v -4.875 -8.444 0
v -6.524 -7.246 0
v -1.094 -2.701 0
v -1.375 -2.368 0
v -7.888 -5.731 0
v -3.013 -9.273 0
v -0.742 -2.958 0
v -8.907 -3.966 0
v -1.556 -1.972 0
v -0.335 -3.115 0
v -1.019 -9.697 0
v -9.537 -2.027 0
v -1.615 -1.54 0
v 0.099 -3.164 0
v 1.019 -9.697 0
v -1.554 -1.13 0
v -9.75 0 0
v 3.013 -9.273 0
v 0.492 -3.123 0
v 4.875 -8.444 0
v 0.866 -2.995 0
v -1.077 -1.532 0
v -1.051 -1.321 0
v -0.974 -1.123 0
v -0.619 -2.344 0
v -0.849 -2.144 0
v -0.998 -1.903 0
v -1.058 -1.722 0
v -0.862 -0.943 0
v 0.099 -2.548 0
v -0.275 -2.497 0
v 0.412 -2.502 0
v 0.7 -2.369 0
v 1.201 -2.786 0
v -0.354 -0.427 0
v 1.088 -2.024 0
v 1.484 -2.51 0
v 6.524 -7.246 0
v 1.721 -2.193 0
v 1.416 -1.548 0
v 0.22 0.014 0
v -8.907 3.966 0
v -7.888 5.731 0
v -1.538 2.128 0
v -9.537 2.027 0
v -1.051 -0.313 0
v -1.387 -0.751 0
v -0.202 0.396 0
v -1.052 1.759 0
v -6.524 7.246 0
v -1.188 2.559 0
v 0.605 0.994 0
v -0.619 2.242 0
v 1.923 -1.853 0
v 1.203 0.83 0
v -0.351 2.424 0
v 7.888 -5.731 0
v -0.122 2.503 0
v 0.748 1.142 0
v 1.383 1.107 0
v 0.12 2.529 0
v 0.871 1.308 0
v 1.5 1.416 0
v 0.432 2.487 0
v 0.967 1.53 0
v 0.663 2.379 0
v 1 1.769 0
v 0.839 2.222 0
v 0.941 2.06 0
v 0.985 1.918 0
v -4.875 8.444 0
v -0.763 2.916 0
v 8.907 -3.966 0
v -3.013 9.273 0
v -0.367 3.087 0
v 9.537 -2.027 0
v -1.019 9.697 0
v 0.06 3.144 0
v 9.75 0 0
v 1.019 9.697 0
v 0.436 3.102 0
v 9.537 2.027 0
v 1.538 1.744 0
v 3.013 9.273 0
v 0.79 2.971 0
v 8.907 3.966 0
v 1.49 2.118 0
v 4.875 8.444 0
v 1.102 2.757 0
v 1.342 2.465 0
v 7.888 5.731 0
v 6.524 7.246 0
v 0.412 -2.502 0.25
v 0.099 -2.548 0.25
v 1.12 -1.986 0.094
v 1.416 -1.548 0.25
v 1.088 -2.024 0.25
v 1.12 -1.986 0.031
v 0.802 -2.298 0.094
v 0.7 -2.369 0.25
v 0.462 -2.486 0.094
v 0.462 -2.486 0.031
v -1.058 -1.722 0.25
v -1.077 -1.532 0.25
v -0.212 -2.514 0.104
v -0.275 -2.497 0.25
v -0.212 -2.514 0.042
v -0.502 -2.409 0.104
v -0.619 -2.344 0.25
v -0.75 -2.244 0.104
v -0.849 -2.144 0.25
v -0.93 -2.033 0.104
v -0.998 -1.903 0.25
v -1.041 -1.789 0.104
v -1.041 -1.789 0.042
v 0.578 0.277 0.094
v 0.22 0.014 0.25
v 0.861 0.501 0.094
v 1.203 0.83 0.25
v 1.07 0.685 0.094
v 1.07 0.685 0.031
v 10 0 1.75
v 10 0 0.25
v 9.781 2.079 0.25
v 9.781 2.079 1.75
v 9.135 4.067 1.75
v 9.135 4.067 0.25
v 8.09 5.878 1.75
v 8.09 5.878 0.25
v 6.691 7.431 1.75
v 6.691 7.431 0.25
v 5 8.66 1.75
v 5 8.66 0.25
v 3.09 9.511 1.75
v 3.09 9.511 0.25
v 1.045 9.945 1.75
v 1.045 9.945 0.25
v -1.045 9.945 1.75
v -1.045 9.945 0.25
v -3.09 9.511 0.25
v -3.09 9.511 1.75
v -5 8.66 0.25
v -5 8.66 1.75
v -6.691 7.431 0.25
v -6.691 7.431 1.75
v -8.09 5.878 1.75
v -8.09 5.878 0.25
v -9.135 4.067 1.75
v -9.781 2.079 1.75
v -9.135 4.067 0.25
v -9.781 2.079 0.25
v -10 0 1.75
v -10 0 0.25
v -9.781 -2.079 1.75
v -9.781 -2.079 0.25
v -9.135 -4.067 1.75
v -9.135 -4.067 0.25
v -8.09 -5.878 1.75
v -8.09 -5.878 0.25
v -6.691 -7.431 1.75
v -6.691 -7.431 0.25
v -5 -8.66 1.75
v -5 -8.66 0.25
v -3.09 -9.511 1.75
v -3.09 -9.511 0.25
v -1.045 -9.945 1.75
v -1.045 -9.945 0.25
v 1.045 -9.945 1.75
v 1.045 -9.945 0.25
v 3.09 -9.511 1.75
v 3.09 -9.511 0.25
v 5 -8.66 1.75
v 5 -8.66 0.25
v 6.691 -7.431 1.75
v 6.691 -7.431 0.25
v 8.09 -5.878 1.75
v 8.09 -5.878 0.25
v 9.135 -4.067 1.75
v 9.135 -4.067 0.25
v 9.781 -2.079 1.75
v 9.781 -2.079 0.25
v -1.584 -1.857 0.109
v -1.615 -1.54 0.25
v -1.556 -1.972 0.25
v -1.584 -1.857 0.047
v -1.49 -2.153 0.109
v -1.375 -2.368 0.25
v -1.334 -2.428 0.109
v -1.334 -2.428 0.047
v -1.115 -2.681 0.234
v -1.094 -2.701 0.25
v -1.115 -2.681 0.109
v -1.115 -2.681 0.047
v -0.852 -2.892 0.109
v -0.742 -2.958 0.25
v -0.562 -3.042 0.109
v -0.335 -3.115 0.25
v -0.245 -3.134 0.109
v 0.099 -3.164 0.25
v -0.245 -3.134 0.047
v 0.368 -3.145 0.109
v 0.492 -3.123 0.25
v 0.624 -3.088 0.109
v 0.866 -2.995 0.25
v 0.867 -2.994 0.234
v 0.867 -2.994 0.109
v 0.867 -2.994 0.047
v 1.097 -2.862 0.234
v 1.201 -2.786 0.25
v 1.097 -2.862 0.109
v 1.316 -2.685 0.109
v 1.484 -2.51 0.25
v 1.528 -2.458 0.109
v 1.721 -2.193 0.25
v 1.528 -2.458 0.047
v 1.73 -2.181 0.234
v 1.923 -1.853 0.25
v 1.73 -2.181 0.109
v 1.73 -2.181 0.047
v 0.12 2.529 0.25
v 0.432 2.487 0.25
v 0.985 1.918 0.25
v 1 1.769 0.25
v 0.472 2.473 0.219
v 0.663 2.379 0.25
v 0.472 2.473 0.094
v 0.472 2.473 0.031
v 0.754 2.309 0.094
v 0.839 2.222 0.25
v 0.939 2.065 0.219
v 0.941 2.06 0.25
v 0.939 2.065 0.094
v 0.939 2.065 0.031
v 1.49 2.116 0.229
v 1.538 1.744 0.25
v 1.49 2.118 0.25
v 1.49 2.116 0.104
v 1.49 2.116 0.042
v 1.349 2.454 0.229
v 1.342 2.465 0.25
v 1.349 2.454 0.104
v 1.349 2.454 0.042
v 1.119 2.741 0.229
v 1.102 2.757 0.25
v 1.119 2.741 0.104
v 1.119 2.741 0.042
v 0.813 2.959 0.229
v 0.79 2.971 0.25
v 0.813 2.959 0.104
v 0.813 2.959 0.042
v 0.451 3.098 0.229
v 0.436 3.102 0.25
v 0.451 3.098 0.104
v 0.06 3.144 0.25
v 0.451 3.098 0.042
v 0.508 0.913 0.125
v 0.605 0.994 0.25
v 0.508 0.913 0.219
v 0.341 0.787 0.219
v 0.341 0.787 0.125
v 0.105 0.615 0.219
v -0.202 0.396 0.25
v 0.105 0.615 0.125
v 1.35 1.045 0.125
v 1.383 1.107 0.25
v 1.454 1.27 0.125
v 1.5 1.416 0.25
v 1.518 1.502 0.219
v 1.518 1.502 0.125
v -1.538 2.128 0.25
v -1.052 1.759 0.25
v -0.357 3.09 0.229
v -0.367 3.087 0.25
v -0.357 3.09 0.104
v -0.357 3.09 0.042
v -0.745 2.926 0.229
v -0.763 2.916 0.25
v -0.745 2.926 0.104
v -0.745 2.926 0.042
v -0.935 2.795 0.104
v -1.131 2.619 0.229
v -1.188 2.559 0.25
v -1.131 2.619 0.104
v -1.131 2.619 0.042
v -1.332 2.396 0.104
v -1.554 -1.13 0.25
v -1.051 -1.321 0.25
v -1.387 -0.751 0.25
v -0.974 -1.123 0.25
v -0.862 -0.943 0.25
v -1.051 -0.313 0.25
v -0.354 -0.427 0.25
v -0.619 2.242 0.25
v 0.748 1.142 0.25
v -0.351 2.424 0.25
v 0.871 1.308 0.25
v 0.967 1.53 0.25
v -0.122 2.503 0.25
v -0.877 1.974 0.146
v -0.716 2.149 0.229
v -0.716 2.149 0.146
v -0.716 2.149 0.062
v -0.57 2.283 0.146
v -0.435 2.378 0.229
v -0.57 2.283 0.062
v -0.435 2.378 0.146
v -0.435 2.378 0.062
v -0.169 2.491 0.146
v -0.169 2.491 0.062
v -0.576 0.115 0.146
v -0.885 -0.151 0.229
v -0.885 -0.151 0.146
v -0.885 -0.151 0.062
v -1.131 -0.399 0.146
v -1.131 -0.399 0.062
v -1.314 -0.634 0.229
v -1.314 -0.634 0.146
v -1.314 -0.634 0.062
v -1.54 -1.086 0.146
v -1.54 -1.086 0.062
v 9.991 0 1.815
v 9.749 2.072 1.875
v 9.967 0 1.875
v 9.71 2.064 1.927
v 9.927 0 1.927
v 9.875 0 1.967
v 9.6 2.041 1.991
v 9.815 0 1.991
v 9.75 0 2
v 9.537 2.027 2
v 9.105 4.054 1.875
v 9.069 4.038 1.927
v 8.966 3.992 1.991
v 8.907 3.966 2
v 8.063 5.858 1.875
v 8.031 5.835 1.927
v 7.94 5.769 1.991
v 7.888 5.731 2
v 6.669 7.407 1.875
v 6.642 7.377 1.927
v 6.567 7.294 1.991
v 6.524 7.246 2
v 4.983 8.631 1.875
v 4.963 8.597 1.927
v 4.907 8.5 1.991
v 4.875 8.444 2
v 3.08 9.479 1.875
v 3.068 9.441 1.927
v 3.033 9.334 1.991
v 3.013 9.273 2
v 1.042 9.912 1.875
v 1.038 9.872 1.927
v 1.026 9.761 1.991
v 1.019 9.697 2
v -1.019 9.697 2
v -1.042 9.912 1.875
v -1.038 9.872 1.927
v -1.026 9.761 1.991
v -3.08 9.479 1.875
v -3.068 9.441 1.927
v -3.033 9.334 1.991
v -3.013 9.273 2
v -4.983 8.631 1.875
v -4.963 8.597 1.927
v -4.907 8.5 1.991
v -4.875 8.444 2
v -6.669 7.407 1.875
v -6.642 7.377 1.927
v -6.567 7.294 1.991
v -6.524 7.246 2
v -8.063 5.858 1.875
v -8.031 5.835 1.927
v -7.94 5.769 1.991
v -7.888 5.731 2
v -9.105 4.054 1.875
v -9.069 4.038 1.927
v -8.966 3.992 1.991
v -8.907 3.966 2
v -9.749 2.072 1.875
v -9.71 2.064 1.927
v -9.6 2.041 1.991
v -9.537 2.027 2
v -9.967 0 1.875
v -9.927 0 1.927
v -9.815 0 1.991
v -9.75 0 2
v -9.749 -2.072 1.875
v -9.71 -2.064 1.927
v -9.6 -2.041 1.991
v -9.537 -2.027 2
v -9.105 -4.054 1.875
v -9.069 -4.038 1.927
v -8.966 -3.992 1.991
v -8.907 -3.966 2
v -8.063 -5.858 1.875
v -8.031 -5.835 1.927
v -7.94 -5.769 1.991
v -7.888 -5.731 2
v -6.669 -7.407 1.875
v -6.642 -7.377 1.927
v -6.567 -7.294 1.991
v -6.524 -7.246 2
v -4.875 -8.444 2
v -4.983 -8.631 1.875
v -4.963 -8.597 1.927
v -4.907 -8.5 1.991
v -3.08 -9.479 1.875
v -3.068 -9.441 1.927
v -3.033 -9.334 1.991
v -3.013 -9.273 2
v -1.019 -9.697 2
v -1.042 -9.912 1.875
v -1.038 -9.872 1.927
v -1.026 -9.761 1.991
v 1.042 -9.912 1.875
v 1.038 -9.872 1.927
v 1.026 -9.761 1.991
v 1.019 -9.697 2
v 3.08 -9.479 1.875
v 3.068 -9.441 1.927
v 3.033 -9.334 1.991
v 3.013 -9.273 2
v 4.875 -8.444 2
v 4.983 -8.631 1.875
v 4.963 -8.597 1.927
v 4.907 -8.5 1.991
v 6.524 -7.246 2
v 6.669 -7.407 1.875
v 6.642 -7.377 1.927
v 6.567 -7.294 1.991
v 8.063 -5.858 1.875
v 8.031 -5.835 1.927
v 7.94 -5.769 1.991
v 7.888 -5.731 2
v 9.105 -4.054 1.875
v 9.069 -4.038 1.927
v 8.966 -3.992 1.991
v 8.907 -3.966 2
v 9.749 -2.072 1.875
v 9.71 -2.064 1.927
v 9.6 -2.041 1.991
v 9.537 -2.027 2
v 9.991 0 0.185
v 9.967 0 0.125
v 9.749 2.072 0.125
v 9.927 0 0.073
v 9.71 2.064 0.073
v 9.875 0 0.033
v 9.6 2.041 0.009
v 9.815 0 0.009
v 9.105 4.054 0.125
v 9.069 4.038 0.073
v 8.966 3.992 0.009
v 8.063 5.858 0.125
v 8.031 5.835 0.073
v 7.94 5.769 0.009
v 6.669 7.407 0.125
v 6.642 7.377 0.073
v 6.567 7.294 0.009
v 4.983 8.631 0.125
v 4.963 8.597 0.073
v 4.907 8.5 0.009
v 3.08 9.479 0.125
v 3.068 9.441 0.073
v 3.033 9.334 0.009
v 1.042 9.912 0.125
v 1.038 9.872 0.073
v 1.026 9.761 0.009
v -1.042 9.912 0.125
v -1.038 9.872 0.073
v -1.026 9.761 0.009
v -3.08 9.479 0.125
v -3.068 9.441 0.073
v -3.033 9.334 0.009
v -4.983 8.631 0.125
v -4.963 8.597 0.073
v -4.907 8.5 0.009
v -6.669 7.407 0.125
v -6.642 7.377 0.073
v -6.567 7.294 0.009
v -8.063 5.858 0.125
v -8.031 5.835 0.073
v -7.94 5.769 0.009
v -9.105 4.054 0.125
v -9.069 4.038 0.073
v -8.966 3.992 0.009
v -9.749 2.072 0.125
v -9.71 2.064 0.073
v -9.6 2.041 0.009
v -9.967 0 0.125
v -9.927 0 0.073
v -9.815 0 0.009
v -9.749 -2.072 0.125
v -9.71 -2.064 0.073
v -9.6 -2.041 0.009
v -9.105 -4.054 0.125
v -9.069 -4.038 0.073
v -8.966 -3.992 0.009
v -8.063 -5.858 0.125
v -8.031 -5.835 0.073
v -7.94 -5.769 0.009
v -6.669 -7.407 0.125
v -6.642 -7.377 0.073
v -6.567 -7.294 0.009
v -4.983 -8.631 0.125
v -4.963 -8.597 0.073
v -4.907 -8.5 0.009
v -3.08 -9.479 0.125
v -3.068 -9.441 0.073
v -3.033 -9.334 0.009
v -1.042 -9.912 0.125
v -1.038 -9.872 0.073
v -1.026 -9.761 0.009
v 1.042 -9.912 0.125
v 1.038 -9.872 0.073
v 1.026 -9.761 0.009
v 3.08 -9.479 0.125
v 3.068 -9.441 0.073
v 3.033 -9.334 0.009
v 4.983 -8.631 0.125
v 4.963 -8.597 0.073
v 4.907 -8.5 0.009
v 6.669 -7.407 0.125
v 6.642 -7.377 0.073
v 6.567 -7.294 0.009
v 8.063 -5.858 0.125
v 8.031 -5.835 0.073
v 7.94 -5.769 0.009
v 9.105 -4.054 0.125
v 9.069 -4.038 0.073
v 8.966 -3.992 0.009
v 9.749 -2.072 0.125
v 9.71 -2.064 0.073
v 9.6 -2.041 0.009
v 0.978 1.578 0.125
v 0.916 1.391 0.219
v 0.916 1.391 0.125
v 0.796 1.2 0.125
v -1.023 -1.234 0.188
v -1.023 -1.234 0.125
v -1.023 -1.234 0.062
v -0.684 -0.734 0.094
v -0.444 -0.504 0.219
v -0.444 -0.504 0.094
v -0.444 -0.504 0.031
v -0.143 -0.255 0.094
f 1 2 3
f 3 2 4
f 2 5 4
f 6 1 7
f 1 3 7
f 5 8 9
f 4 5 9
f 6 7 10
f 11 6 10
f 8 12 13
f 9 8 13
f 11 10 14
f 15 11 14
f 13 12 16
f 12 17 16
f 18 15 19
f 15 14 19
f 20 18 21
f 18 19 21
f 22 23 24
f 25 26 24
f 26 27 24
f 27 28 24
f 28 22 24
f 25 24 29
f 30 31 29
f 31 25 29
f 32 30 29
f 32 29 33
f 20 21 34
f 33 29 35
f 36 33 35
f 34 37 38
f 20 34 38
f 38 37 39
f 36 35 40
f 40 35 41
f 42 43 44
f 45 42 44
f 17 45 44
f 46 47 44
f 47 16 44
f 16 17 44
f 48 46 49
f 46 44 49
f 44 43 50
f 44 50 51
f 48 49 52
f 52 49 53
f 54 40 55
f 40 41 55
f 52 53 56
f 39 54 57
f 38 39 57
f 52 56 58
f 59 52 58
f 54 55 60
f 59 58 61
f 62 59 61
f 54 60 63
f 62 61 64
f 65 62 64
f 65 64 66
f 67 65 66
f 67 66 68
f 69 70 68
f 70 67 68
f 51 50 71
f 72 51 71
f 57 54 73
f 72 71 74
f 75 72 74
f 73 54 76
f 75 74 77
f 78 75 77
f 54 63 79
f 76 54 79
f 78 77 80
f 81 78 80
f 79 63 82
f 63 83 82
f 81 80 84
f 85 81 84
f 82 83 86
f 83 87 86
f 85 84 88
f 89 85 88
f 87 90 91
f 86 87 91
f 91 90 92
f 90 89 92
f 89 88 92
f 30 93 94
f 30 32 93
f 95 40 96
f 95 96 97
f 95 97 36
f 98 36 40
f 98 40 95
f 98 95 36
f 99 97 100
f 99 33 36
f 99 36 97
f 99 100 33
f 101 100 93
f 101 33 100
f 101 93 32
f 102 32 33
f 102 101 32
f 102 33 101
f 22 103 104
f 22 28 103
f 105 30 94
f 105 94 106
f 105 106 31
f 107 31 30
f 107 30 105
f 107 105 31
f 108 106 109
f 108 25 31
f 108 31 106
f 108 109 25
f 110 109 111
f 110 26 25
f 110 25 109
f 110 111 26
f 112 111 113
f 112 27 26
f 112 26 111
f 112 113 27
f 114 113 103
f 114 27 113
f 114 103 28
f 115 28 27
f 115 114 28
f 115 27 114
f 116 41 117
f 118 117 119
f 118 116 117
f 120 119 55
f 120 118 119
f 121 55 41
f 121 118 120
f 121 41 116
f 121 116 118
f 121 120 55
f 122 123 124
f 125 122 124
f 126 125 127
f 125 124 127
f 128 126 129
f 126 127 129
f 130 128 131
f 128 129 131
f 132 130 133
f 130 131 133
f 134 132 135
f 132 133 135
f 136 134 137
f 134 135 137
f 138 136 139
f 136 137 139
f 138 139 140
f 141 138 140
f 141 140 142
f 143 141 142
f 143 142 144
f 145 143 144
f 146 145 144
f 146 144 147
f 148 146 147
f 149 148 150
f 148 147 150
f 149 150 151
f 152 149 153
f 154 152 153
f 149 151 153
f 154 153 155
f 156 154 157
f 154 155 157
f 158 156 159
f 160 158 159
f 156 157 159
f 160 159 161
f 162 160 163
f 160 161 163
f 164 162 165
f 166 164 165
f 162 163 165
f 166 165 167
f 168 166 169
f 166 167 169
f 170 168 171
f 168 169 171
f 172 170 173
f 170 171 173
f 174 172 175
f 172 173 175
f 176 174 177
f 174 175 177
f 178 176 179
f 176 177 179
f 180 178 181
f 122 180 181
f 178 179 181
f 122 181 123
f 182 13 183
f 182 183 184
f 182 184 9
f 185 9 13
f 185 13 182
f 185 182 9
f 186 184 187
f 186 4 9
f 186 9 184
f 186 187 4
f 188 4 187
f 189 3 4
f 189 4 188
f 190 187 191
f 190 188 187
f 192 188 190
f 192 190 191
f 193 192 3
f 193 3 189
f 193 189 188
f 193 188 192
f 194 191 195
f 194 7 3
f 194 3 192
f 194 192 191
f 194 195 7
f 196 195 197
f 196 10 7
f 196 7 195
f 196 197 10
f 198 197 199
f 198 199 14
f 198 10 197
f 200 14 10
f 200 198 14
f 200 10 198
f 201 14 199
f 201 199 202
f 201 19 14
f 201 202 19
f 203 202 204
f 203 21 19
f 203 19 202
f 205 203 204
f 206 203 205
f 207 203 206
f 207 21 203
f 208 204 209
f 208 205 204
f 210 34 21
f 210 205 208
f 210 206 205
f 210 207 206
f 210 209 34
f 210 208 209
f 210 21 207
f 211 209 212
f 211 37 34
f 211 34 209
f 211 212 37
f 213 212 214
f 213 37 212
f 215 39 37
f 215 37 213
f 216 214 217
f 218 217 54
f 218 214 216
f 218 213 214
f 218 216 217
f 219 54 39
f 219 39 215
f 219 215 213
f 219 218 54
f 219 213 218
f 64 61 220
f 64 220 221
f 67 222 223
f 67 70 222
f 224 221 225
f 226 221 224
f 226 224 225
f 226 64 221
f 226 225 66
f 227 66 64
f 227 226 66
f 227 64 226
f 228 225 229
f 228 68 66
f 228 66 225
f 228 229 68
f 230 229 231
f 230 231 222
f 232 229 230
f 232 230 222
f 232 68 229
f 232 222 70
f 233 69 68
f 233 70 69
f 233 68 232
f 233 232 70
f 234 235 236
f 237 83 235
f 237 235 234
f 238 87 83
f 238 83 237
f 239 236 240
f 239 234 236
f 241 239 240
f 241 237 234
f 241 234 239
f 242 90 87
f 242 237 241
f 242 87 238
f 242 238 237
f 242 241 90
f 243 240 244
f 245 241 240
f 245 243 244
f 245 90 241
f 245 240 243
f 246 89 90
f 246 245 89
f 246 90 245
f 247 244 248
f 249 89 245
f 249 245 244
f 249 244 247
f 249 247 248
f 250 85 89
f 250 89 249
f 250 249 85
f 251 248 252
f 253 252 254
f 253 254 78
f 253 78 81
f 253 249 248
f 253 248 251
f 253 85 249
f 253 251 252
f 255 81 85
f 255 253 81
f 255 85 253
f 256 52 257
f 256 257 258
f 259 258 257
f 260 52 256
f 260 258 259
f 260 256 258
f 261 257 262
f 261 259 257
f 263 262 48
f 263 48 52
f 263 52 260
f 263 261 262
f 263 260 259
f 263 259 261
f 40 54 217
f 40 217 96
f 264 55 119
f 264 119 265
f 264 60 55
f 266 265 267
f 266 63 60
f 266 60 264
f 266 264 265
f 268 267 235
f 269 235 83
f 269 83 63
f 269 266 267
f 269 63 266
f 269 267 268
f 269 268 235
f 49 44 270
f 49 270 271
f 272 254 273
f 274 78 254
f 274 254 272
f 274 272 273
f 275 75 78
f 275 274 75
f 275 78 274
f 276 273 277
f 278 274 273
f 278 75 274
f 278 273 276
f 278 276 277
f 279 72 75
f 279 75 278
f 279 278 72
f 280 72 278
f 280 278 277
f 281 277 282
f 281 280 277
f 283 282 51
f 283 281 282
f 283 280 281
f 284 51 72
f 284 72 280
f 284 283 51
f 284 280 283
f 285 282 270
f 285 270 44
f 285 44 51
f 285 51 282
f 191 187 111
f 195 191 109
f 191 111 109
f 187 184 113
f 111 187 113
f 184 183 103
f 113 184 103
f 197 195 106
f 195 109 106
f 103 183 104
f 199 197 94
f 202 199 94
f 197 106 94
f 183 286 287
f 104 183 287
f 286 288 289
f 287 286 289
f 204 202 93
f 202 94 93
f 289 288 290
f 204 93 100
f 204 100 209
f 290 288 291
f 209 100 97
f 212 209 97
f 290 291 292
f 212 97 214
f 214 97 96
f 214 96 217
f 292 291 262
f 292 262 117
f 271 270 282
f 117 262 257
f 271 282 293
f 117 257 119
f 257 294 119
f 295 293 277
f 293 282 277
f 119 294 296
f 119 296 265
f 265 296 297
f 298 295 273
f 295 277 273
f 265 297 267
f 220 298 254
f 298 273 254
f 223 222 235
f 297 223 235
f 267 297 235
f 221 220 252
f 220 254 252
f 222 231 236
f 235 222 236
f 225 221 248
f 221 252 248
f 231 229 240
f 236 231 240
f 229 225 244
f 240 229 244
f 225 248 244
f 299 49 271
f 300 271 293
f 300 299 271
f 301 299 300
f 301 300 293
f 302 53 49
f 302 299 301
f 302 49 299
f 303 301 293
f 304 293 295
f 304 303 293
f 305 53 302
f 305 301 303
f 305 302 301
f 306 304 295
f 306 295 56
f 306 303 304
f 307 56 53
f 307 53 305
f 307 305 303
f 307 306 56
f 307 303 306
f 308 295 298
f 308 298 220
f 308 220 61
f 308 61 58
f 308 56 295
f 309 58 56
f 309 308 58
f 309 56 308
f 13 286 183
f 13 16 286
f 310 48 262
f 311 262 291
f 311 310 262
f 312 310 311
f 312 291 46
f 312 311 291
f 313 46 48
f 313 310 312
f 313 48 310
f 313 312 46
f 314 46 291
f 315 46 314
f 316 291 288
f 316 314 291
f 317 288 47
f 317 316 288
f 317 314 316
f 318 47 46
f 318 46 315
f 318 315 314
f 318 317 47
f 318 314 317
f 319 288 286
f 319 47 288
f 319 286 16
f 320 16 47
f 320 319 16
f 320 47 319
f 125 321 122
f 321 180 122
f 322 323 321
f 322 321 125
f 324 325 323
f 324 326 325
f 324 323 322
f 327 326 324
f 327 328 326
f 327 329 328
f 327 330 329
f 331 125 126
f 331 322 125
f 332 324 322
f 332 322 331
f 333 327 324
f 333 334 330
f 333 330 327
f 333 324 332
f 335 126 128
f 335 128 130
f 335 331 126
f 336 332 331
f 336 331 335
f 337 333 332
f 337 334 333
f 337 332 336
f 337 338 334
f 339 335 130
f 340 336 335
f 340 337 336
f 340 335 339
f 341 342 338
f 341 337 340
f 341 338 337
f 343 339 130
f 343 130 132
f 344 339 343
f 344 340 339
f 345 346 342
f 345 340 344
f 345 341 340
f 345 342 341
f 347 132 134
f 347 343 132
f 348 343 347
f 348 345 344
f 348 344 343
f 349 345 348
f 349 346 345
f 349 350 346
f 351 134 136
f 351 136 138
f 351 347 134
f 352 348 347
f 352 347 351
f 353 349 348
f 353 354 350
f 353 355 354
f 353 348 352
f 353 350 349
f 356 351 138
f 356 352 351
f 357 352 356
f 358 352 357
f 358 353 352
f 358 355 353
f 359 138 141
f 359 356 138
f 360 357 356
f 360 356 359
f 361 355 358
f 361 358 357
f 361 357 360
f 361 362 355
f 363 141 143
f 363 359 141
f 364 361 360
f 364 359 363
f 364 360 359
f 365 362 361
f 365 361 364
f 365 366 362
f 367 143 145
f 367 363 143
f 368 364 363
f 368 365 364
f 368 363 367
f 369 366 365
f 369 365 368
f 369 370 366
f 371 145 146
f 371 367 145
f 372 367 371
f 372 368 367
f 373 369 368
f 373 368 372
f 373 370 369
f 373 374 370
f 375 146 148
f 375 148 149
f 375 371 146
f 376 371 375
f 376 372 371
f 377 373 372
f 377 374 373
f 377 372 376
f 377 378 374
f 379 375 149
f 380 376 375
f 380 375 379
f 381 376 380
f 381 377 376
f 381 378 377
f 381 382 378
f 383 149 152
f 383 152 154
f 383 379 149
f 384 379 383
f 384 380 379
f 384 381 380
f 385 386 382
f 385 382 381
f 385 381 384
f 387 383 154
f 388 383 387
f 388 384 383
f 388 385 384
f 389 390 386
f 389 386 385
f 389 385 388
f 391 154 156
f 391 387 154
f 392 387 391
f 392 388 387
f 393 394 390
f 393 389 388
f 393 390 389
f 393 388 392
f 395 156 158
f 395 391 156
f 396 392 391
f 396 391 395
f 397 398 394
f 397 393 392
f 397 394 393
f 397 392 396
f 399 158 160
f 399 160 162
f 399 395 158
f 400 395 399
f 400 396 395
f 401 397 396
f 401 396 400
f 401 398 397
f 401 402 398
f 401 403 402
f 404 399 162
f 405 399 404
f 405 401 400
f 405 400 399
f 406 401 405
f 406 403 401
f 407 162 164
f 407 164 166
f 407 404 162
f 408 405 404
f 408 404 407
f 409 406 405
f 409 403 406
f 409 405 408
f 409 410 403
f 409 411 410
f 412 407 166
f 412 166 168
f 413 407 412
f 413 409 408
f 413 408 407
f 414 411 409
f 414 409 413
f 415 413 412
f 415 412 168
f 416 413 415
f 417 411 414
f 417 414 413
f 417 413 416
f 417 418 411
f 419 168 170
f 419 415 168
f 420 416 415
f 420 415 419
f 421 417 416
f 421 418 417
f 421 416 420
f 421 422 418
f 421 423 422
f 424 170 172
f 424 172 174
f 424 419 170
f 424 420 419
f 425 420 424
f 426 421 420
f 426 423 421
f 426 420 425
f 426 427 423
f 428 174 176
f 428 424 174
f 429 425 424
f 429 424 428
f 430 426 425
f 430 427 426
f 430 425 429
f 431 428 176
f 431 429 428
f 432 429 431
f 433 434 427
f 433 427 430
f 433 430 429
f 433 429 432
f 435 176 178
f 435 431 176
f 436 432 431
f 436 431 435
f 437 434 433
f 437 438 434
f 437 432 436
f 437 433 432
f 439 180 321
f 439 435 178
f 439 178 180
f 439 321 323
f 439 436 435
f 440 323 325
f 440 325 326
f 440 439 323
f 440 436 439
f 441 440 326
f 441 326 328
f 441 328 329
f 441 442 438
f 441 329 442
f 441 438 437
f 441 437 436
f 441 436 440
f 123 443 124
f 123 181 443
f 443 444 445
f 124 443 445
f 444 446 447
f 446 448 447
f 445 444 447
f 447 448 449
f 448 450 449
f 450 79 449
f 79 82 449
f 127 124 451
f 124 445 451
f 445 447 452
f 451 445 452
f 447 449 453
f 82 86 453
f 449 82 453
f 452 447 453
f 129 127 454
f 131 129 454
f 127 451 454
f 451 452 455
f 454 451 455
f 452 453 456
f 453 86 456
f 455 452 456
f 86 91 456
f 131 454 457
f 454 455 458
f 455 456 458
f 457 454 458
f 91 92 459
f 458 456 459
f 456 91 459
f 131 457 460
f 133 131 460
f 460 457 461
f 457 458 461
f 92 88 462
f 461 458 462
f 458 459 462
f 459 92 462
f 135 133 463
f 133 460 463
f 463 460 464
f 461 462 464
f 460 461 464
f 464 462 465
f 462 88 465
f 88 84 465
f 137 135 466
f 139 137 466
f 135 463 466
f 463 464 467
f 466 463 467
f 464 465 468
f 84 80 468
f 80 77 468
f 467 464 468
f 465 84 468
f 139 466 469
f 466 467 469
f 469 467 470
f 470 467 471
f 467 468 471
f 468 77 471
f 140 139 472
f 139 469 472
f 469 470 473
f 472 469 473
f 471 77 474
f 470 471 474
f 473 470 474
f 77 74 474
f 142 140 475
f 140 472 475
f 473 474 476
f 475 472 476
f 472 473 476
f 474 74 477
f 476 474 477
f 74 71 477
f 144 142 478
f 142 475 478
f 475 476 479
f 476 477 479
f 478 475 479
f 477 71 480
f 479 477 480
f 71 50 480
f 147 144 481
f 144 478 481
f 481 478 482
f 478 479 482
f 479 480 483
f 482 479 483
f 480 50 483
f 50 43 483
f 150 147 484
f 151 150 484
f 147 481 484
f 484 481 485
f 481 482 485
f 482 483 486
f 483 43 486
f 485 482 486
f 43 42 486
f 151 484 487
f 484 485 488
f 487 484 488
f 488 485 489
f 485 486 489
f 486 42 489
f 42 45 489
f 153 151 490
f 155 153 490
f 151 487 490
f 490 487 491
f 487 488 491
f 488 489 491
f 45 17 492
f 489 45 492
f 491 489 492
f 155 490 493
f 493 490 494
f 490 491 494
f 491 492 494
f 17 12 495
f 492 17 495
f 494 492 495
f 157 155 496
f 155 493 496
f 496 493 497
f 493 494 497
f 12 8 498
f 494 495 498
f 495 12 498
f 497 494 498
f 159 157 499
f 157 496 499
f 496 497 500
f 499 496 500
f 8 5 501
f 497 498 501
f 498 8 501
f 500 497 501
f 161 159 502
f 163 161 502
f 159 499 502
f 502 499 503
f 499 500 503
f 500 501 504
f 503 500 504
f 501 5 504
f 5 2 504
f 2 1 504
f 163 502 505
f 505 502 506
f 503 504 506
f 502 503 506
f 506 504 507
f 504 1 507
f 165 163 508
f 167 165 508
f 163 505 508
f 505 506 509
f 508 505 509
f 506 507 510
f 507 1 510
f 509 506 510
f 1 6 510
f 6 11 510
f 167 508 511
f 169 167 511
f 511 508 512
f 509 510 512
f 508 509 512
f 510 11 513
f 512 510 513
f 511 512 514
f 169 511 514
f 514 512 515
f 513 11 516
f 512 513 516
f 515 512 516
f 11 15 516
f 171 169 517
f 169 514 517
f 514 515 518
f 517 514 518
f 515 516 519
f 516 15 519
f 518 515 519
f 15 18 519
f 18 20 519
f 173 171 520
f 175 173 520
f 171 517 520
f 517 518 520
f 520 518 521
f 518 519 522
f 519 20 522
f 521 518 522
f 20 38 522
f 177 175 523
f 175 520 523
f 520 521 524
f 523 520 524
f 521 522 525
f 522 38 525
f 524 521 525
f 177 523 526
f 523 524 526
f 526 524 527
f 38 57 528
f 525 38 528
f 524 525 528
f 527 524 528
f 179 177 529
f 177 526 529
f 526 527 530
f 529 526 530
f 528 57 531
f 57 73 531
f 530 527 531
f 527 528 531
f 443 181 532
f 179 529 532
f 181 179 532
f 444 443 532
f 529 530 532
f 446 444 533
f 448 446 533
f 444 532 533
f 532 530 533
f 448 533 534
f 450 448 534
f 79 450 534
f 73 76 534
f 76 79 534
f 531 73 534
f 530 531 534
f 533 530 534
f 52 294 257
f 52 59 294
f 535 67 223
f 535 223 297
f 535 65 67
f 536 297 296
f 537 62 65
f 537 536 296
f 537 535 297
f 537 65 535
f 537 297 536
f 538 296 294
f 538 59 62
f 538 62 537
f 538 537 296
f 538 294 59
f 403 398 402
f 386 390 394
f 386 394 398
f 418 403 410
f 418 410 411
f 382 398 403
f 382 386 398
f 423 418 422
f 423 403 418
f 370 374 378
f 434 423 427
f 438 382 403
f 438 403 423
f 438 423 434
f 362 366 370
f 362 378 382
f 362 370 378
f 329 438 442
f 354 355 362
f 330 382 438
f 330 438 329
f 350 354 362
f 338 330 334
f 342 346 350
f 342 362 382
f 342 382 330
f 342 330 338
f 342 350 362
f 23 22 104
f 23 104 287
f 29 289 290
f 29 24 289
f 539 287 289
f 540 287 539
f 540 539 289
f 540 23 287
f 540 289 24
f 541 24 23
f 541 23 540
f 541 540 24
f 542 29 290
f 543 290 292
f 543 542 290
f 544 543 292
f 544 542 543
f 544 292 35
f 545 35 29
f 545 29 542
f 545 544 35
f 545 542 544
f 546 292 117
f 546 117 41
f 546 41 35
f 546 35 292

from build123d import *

# Parameters (mm, degrees)
ESQUISSE1_R             = 10
BOSS_EXTRU_1_DEPTH      = 2
CONG_1_R                = 0.25
ENL_V_MAT_EXTRU_1_DEPTH = 0.25


with BuildPart() as part:
    # Esquisse1 → Boss.-Extru.1 (new body)
    with BuildSketch(Plane.XY):
        Circle(ESQUISSE1_R)
    extrude(amount=BOSS_EXTRU_1_DEPTH)

    # Congé1
    cong_1_edges = [part.edges().sort_by_distance(p)[0] for p in [
        (-10, 0, 0),
        (-10, 0, 2),
    ]]
    fillet(cong_1_edges, radius=CONG_1_R)

    # Esquisse2 → Enlèv. mat.-Extru.1 (cut)
    with BuildSketch(Plane(origin=(0, 0, 0), x_dir=(-1, 0, 0), z_dir=(0, 0, -1))):
        with BuildLine():
            Line((-1.923076923, -1.852508928), (-1.415865385, -1.54842239))
            add(Edge.make_bspline(
                [(-1.415865385, -1.54842239), (-1.368691264, -1.627389907), (-1.278307468, -1.778688622), (-1.12753371, -1.983130977), (-0.971305862, -2.156894674), (-0.808467004, -2.298968859), (-0.640011093, -2.410824093), (-0.46483843, -2.490027919), (-0.283539326, -2.539426734), (-0.160155632, -2.545426882), (-0.098557692, -2.54842239)],
                knots=[0, 0, 0, 0, 1.272034388, 2.437168799, 3.508375237, 4.49857839, 5.41946034, 6.295179144, 7.148887113, 8, 8, 8, 8], degree=3))
            add(Edge.make_bspline(
                [(-0.098557692, -2.54842239), (-0.045951646, -2.546957237), (0.058339965, -2.544052568), (0.211875239, -2.516142621), (0.3609869, -2.473264686), (0.502601707, -2.411857375), (0.634765618, -2.337562828), (0.75066281, -2.247826524), (0.850856147, -2.147358742), (0.932814629, -2.035274192), (0.99569469, -1.914730508), (1.04402395, -1.791000306), (1.070844076, -1.662139903), (1.074884225, -1.57537911), (1.076923077, -1.531595467)],
                knots=[0, 0, 0, 0, 1.095163259, 2.171163733, 3.241058638, 4.321873601, 5.38011039, 6.391990106, 7.366004449, 8.327778327, 9.272591725, 10.192022065, 11.087607919, 12, 12, 12, 12], degree=3))
            add(Edge.make_bspline(
                [(1.076923077, -1.531595467), (1.074395687, -1.481639724), (1.069257873, -1.380087), (1.025832479, -1.230259023), (0.957519484, -1.081986046), (0.894497809, -0.990269591), (0.861778846, -0.942653159)],
                knots=[0, 0, 0, 0, 0.938893495, 1.908633276, 2.914225137, 4, 4, 4, 4], degree=3))
            add(Edge.make_bspline(
                [(0.861778846, -0.942653159), (0.834914936, -0.908287176), (0.778517517, -0.836140092), (0.681561781, -0.72874826), (0.5677913, -0.617973828), (0.441099491, -0.499586873), (0.296871339, -0.379093507), (0.139624172, -0.250747888), (-0.03465673, -0.119430899), (-0.156884438, -0.031363643), (-0.219951923, 0.01407761)],
                knots=[0, 0, 0, 0, 0.722233717, 1.516239348, 2.393582979, 3.351407094, 4.387010283, 5.505090956, 6.712668013, 8, 8, 8, 8], degree=3))
            add(Edge.make_bspline(
                [(-0.219951923, 0.01407761), (-0.283078774, 0.059040903), (-0.403772505, 0.145007296), (-0.572558646, 0.272591783), (-0.723492011, 0.389238416), (-0.855901754, 0.496045294), (-0.969729634, 0.593026902), (-1.065872625, 0.679251941), (-1.14188158, 0.757052331), (-1.184148289, 0.807523202), (-1.203125, 0.83018338)],
                knots=[0, 0, 0, 0, 1.452282411, 2.77665338, 3.964542531, 5.026858415, 5.96415736, 6.766646006, 7.446254459, 8, 8, 8, 8], degree=3))
            add(Edge.make_bspline(
                [(-1.203125, 0.83018338), (-1.229649363, 0.865499443), (-1.281813083, 0.934953221), (-1.350669093, 1.04351012), (-1.409193372, 1.154635718), (-1.455071655, 1.268628628), (-1.493705173, 1.383888506), (-1.519690198, 1.501919213), (-1.535961164, 1.622191131), (-1.537627426, 1.70312856), (-1.538461538, 1.743644918)],
                knots=[0, 0, 0, 0, 1.068054152, 2.10047183, 3.106115577, 4.101338837, 5.06977816, 6.043150881, 7.020423561, 8, 8, 8, 8], degree=3))
            add(Edge.make_bspline(
                [(-1.538461538, 1.743644918), (-1.536224037, 1.807124532), (-1.53179686, 1.932726927), (-1.494355973, 2.11620835), (-1.435259584, 2.291385065), (-1.352468348, 2.45652278), (-1.245741457, 2.607321605), (-1.122234073, 2.745516154), (-0.975128668, 2.861690866), (-0.813724171, 2.963197252), (-0.637056104, 3.04264741), (-0.451928841, 3.102580518), (-0.258048146, 3.136539246), (-0.126728487, 3.141412557), (-0.060096154, 3.143885303)],
                knots=[0, 0, 0, 0, 1.005424448, 1.989358655, 2.955360095, 3.929531133, 4.905563448, 5.876582895, 6.856512386, 7.866279853, 8.892233794, 9.918561126, 10.94386622, 12, 12, 12, 12], degree=3))
            add(Edge.make_bspline(
                [(-0.060096154, 3.143885303), (0.010608018, 3.141446643), (0.15121605, 3.136596927), (0.358043276, 3.09442973), (0.557175933, 3.02465715), (0.717364387, 2.945476593), (0.842734835, 2.866394166), (0.938345234, 2.794360182), (1.035232293, 2.711431424), (1.134177529, 2.617387002), (1.233504374, 2.511364001), (1.334687435, 2.394088534), (1.437963325, 2.266277295), (1.504401942, 2.175035294), (1.538461538, 2.128260303)],
                knots=[0, 0, 0, 0, 1.286793592, 2.559021753, 3.825965368, 5.121522368, 5.803751409, 6.523245864, 7.299691795, 8.125521123, 9.008227632, 9.944561021, 10.946284179, 12, 12, 12, 12], degree=3))
            Line((1.538461538, 2.128260303), (1.051682692, 1.759269918))
            add(Edge.make_bspline(
                [(1.051682692, 1.759269918), (1.022289665, 1.797136244), (0.965685567, 1.870057936), (0.879749304, 1.972180191), (0.798751622, 2.065465585), (0.718950937, 2.146491518), (0.644561854, 2.219695175), (0.57236121, 2.282369044), (0.503388037, 2.335127208), (0.416444761, 2.391430454), (0.307214387, 2.447241602), (0.170098039, 2.494468593), (0.026807282, 2.5228487), (-0.070786372, 2.526601078), (-0.120192308, 2.528500687)],
                knots=[0, 0, 0, 0, 1.181633172, 2.275549214, 3.290209073, 4.226197932, 5.078386478, 5.862611352, 6.581680152, 7.217281963, 8.414376989, 9.595101626, 10.782541182, 12, 12, 12, 12], degree=3))
            add(Edge.make_bspline(
                [(-0.120192308, 2.528500687), (-0.182174918, 2.526423487), (-0.301702542, 2.522417803), (-0.471400089, 2.478669257), (-0.624132532, 2.409786068), (-0.755365501, 2.313246105), (-0.86462889, 2.198867261), (-0.943666819, 2.067246366), (-0.99123853, 1.921905105), (-0.997043581, 1.820519408), (-1, 1.768885303)],
                knots=[0, 0, 0, 0, 1.14458467, 2.207223713, 3.21896685, 4.227309161, 5.202851033, 6.127160689, 7.046193047, 8, 8, 8, 8], degree=3))
            add(Edge.make_bspline(
                [(-1, 1.768885303), (-0.999326069, 1.736739911), (-0.997977104, 1.672396563), (-0.979163165, 1.577336983), (-0.954992887, 1.482517544), (-0.916691232, 1.388364545), (-0.863813569, 1.293231358), (-0.794376125, 1.195479808), (-0.706924732, 1.094248307), (-0.639935568, 1.028407095), (-0.604567308, 0.993644918)],
                knots=[0, 0, 0, 0, 0.858281714, 1.717966888, 2.583508476, 3.4729293, 4.427298488, 5.488583878, 6.674047936, 8, 8, 8, 8], degree=3))
            add(Edge.make_bspline(
                [(-0.604567308, 0.993644918), (-0.591433526, 0.981924302), (-0.560230668, 0.954078802), (-0.503186224, 0.908492036), (-0.427855713, 0.852258712), (-0.336206225, 0.782680455), (-0.226547891, 0.701969377), (-0.098868652, 0.61115747), (0.045408262, 0.507296683), (0.147788689, 0.434683757), (0.201923077, 0.396289149)],
                knots=[0, 0, 0, 0, 0.420754252, 0.999615792, 1.744751191, 2.668019286, 3.750313428, 4.999500688, 6.413464383, 8, 8, 8, 8], degree=3))
            add(Edge.make_bspline(
                [(0.201923077, 0.396289149), (0.267041785, 0.348903961), (0.393135139, 0.257149112), (0.572548133, 0.119293661), (0.735223233, -0.015531085), (0.881731582, -0.146464126), (1.013520568, -0.272512285), (1.129128089, -0.395192023), (1.229732112, -0.513624434), (1.338039344, -0.665463135), (1.448709892, -0.851944993), (1.543752476, -1.080421974), (1.603681072, -1.309787095), (1.611517955, -1.463947386), (1.615384615, -1.540008928)],
                knots=[0, 0, 0, 0, 1.163667725, 2.253281268, 3.268753668, 4.215851969, 5.092017293, 5.902905408, 6.650798638, 7.335211899, 8.59617414, 9.77448103, 10.901945474, 12, 12, 12, 12], degree=3))
            add(Edge.make_bspline(
                [(1.615384615, -1.540008928), (1.614258093, -1.593800411), (1.612026924, -1.700338783), (1.586379643, -1.856776058), (1.548803075, -2.008714691), (1.492167816, -2.154276598), (1.423042402, -2.296124763), (1.335328834, -2.430538307), (1.233658518, -2.560492133), (1.117029206, -2.682520975), (0.98940766, -2.794543025), (0.854521326, -2.894192845), (0.712149429, -2.977281399), (0.563064315, -3.045082843), (0.407231738, -3.09811173), (0.244704109, -3.136533791), (0.075213518, -3.16011501), (-0.039987308, -3.162562601), (-0.098557692, -3.163807005)],
                knots=[0, 0, 0, 0, 0.983748083, 1.948392443, 2.894712957, 3.844097841, 4.80183111, 5.778335162, 6.776009319, 7.81870978, 8.863265674, 9.881300176, 10.883814829, 11.87499822, 12.874611388, 13.892143829, 14.928324115, 16, 16, 16, 16], degree=3))
            add(Edge.make_bspline(
                [(-0.098557692, -3.163807005), (-0.143875423, -3.162930694), (-0.233940155, -3.161189107), (-0.367156409, -3.145792627), (-0.497681419, -3.12400902), (-0.623877331, -3.089424901), (-0.747370037, -3.047464368), (-0.867622439, -2.995798655), (-0.984692817, -2.933883453), (-1.099237245, -2.863091982), (-1.210964401, -2.780707277), (-1.318826346, -2.684752712), (-1.426362093, -2.577874703), (-1.53039763, -2.45717088), (-1.633037305, -2.32459131), (-1.732257436, -2.178895567), (-1.830111809, -2.020877246), (-1.891509754, -1.909679956), (-1.923076923, -1.852508928)],
                knots=[0, 0, 0, 0, 0.915332311, 1.819136955, 2.706846663, 3.586547465, 4.459518054, 5.340707479, 6.227863349, 7.133153174, 8.059268498, 9.028702269, 10.047606654, 11.120612155, 12.245963614, 13.433783089, 14.680604001, 16, 16, 16, 16], degree=3))
        make_face()
    extrude(amount=-ENL_V_MAT_EXTRU_1_DEPTH, mode=Mode.SUBTRACT)


solid = part.part
